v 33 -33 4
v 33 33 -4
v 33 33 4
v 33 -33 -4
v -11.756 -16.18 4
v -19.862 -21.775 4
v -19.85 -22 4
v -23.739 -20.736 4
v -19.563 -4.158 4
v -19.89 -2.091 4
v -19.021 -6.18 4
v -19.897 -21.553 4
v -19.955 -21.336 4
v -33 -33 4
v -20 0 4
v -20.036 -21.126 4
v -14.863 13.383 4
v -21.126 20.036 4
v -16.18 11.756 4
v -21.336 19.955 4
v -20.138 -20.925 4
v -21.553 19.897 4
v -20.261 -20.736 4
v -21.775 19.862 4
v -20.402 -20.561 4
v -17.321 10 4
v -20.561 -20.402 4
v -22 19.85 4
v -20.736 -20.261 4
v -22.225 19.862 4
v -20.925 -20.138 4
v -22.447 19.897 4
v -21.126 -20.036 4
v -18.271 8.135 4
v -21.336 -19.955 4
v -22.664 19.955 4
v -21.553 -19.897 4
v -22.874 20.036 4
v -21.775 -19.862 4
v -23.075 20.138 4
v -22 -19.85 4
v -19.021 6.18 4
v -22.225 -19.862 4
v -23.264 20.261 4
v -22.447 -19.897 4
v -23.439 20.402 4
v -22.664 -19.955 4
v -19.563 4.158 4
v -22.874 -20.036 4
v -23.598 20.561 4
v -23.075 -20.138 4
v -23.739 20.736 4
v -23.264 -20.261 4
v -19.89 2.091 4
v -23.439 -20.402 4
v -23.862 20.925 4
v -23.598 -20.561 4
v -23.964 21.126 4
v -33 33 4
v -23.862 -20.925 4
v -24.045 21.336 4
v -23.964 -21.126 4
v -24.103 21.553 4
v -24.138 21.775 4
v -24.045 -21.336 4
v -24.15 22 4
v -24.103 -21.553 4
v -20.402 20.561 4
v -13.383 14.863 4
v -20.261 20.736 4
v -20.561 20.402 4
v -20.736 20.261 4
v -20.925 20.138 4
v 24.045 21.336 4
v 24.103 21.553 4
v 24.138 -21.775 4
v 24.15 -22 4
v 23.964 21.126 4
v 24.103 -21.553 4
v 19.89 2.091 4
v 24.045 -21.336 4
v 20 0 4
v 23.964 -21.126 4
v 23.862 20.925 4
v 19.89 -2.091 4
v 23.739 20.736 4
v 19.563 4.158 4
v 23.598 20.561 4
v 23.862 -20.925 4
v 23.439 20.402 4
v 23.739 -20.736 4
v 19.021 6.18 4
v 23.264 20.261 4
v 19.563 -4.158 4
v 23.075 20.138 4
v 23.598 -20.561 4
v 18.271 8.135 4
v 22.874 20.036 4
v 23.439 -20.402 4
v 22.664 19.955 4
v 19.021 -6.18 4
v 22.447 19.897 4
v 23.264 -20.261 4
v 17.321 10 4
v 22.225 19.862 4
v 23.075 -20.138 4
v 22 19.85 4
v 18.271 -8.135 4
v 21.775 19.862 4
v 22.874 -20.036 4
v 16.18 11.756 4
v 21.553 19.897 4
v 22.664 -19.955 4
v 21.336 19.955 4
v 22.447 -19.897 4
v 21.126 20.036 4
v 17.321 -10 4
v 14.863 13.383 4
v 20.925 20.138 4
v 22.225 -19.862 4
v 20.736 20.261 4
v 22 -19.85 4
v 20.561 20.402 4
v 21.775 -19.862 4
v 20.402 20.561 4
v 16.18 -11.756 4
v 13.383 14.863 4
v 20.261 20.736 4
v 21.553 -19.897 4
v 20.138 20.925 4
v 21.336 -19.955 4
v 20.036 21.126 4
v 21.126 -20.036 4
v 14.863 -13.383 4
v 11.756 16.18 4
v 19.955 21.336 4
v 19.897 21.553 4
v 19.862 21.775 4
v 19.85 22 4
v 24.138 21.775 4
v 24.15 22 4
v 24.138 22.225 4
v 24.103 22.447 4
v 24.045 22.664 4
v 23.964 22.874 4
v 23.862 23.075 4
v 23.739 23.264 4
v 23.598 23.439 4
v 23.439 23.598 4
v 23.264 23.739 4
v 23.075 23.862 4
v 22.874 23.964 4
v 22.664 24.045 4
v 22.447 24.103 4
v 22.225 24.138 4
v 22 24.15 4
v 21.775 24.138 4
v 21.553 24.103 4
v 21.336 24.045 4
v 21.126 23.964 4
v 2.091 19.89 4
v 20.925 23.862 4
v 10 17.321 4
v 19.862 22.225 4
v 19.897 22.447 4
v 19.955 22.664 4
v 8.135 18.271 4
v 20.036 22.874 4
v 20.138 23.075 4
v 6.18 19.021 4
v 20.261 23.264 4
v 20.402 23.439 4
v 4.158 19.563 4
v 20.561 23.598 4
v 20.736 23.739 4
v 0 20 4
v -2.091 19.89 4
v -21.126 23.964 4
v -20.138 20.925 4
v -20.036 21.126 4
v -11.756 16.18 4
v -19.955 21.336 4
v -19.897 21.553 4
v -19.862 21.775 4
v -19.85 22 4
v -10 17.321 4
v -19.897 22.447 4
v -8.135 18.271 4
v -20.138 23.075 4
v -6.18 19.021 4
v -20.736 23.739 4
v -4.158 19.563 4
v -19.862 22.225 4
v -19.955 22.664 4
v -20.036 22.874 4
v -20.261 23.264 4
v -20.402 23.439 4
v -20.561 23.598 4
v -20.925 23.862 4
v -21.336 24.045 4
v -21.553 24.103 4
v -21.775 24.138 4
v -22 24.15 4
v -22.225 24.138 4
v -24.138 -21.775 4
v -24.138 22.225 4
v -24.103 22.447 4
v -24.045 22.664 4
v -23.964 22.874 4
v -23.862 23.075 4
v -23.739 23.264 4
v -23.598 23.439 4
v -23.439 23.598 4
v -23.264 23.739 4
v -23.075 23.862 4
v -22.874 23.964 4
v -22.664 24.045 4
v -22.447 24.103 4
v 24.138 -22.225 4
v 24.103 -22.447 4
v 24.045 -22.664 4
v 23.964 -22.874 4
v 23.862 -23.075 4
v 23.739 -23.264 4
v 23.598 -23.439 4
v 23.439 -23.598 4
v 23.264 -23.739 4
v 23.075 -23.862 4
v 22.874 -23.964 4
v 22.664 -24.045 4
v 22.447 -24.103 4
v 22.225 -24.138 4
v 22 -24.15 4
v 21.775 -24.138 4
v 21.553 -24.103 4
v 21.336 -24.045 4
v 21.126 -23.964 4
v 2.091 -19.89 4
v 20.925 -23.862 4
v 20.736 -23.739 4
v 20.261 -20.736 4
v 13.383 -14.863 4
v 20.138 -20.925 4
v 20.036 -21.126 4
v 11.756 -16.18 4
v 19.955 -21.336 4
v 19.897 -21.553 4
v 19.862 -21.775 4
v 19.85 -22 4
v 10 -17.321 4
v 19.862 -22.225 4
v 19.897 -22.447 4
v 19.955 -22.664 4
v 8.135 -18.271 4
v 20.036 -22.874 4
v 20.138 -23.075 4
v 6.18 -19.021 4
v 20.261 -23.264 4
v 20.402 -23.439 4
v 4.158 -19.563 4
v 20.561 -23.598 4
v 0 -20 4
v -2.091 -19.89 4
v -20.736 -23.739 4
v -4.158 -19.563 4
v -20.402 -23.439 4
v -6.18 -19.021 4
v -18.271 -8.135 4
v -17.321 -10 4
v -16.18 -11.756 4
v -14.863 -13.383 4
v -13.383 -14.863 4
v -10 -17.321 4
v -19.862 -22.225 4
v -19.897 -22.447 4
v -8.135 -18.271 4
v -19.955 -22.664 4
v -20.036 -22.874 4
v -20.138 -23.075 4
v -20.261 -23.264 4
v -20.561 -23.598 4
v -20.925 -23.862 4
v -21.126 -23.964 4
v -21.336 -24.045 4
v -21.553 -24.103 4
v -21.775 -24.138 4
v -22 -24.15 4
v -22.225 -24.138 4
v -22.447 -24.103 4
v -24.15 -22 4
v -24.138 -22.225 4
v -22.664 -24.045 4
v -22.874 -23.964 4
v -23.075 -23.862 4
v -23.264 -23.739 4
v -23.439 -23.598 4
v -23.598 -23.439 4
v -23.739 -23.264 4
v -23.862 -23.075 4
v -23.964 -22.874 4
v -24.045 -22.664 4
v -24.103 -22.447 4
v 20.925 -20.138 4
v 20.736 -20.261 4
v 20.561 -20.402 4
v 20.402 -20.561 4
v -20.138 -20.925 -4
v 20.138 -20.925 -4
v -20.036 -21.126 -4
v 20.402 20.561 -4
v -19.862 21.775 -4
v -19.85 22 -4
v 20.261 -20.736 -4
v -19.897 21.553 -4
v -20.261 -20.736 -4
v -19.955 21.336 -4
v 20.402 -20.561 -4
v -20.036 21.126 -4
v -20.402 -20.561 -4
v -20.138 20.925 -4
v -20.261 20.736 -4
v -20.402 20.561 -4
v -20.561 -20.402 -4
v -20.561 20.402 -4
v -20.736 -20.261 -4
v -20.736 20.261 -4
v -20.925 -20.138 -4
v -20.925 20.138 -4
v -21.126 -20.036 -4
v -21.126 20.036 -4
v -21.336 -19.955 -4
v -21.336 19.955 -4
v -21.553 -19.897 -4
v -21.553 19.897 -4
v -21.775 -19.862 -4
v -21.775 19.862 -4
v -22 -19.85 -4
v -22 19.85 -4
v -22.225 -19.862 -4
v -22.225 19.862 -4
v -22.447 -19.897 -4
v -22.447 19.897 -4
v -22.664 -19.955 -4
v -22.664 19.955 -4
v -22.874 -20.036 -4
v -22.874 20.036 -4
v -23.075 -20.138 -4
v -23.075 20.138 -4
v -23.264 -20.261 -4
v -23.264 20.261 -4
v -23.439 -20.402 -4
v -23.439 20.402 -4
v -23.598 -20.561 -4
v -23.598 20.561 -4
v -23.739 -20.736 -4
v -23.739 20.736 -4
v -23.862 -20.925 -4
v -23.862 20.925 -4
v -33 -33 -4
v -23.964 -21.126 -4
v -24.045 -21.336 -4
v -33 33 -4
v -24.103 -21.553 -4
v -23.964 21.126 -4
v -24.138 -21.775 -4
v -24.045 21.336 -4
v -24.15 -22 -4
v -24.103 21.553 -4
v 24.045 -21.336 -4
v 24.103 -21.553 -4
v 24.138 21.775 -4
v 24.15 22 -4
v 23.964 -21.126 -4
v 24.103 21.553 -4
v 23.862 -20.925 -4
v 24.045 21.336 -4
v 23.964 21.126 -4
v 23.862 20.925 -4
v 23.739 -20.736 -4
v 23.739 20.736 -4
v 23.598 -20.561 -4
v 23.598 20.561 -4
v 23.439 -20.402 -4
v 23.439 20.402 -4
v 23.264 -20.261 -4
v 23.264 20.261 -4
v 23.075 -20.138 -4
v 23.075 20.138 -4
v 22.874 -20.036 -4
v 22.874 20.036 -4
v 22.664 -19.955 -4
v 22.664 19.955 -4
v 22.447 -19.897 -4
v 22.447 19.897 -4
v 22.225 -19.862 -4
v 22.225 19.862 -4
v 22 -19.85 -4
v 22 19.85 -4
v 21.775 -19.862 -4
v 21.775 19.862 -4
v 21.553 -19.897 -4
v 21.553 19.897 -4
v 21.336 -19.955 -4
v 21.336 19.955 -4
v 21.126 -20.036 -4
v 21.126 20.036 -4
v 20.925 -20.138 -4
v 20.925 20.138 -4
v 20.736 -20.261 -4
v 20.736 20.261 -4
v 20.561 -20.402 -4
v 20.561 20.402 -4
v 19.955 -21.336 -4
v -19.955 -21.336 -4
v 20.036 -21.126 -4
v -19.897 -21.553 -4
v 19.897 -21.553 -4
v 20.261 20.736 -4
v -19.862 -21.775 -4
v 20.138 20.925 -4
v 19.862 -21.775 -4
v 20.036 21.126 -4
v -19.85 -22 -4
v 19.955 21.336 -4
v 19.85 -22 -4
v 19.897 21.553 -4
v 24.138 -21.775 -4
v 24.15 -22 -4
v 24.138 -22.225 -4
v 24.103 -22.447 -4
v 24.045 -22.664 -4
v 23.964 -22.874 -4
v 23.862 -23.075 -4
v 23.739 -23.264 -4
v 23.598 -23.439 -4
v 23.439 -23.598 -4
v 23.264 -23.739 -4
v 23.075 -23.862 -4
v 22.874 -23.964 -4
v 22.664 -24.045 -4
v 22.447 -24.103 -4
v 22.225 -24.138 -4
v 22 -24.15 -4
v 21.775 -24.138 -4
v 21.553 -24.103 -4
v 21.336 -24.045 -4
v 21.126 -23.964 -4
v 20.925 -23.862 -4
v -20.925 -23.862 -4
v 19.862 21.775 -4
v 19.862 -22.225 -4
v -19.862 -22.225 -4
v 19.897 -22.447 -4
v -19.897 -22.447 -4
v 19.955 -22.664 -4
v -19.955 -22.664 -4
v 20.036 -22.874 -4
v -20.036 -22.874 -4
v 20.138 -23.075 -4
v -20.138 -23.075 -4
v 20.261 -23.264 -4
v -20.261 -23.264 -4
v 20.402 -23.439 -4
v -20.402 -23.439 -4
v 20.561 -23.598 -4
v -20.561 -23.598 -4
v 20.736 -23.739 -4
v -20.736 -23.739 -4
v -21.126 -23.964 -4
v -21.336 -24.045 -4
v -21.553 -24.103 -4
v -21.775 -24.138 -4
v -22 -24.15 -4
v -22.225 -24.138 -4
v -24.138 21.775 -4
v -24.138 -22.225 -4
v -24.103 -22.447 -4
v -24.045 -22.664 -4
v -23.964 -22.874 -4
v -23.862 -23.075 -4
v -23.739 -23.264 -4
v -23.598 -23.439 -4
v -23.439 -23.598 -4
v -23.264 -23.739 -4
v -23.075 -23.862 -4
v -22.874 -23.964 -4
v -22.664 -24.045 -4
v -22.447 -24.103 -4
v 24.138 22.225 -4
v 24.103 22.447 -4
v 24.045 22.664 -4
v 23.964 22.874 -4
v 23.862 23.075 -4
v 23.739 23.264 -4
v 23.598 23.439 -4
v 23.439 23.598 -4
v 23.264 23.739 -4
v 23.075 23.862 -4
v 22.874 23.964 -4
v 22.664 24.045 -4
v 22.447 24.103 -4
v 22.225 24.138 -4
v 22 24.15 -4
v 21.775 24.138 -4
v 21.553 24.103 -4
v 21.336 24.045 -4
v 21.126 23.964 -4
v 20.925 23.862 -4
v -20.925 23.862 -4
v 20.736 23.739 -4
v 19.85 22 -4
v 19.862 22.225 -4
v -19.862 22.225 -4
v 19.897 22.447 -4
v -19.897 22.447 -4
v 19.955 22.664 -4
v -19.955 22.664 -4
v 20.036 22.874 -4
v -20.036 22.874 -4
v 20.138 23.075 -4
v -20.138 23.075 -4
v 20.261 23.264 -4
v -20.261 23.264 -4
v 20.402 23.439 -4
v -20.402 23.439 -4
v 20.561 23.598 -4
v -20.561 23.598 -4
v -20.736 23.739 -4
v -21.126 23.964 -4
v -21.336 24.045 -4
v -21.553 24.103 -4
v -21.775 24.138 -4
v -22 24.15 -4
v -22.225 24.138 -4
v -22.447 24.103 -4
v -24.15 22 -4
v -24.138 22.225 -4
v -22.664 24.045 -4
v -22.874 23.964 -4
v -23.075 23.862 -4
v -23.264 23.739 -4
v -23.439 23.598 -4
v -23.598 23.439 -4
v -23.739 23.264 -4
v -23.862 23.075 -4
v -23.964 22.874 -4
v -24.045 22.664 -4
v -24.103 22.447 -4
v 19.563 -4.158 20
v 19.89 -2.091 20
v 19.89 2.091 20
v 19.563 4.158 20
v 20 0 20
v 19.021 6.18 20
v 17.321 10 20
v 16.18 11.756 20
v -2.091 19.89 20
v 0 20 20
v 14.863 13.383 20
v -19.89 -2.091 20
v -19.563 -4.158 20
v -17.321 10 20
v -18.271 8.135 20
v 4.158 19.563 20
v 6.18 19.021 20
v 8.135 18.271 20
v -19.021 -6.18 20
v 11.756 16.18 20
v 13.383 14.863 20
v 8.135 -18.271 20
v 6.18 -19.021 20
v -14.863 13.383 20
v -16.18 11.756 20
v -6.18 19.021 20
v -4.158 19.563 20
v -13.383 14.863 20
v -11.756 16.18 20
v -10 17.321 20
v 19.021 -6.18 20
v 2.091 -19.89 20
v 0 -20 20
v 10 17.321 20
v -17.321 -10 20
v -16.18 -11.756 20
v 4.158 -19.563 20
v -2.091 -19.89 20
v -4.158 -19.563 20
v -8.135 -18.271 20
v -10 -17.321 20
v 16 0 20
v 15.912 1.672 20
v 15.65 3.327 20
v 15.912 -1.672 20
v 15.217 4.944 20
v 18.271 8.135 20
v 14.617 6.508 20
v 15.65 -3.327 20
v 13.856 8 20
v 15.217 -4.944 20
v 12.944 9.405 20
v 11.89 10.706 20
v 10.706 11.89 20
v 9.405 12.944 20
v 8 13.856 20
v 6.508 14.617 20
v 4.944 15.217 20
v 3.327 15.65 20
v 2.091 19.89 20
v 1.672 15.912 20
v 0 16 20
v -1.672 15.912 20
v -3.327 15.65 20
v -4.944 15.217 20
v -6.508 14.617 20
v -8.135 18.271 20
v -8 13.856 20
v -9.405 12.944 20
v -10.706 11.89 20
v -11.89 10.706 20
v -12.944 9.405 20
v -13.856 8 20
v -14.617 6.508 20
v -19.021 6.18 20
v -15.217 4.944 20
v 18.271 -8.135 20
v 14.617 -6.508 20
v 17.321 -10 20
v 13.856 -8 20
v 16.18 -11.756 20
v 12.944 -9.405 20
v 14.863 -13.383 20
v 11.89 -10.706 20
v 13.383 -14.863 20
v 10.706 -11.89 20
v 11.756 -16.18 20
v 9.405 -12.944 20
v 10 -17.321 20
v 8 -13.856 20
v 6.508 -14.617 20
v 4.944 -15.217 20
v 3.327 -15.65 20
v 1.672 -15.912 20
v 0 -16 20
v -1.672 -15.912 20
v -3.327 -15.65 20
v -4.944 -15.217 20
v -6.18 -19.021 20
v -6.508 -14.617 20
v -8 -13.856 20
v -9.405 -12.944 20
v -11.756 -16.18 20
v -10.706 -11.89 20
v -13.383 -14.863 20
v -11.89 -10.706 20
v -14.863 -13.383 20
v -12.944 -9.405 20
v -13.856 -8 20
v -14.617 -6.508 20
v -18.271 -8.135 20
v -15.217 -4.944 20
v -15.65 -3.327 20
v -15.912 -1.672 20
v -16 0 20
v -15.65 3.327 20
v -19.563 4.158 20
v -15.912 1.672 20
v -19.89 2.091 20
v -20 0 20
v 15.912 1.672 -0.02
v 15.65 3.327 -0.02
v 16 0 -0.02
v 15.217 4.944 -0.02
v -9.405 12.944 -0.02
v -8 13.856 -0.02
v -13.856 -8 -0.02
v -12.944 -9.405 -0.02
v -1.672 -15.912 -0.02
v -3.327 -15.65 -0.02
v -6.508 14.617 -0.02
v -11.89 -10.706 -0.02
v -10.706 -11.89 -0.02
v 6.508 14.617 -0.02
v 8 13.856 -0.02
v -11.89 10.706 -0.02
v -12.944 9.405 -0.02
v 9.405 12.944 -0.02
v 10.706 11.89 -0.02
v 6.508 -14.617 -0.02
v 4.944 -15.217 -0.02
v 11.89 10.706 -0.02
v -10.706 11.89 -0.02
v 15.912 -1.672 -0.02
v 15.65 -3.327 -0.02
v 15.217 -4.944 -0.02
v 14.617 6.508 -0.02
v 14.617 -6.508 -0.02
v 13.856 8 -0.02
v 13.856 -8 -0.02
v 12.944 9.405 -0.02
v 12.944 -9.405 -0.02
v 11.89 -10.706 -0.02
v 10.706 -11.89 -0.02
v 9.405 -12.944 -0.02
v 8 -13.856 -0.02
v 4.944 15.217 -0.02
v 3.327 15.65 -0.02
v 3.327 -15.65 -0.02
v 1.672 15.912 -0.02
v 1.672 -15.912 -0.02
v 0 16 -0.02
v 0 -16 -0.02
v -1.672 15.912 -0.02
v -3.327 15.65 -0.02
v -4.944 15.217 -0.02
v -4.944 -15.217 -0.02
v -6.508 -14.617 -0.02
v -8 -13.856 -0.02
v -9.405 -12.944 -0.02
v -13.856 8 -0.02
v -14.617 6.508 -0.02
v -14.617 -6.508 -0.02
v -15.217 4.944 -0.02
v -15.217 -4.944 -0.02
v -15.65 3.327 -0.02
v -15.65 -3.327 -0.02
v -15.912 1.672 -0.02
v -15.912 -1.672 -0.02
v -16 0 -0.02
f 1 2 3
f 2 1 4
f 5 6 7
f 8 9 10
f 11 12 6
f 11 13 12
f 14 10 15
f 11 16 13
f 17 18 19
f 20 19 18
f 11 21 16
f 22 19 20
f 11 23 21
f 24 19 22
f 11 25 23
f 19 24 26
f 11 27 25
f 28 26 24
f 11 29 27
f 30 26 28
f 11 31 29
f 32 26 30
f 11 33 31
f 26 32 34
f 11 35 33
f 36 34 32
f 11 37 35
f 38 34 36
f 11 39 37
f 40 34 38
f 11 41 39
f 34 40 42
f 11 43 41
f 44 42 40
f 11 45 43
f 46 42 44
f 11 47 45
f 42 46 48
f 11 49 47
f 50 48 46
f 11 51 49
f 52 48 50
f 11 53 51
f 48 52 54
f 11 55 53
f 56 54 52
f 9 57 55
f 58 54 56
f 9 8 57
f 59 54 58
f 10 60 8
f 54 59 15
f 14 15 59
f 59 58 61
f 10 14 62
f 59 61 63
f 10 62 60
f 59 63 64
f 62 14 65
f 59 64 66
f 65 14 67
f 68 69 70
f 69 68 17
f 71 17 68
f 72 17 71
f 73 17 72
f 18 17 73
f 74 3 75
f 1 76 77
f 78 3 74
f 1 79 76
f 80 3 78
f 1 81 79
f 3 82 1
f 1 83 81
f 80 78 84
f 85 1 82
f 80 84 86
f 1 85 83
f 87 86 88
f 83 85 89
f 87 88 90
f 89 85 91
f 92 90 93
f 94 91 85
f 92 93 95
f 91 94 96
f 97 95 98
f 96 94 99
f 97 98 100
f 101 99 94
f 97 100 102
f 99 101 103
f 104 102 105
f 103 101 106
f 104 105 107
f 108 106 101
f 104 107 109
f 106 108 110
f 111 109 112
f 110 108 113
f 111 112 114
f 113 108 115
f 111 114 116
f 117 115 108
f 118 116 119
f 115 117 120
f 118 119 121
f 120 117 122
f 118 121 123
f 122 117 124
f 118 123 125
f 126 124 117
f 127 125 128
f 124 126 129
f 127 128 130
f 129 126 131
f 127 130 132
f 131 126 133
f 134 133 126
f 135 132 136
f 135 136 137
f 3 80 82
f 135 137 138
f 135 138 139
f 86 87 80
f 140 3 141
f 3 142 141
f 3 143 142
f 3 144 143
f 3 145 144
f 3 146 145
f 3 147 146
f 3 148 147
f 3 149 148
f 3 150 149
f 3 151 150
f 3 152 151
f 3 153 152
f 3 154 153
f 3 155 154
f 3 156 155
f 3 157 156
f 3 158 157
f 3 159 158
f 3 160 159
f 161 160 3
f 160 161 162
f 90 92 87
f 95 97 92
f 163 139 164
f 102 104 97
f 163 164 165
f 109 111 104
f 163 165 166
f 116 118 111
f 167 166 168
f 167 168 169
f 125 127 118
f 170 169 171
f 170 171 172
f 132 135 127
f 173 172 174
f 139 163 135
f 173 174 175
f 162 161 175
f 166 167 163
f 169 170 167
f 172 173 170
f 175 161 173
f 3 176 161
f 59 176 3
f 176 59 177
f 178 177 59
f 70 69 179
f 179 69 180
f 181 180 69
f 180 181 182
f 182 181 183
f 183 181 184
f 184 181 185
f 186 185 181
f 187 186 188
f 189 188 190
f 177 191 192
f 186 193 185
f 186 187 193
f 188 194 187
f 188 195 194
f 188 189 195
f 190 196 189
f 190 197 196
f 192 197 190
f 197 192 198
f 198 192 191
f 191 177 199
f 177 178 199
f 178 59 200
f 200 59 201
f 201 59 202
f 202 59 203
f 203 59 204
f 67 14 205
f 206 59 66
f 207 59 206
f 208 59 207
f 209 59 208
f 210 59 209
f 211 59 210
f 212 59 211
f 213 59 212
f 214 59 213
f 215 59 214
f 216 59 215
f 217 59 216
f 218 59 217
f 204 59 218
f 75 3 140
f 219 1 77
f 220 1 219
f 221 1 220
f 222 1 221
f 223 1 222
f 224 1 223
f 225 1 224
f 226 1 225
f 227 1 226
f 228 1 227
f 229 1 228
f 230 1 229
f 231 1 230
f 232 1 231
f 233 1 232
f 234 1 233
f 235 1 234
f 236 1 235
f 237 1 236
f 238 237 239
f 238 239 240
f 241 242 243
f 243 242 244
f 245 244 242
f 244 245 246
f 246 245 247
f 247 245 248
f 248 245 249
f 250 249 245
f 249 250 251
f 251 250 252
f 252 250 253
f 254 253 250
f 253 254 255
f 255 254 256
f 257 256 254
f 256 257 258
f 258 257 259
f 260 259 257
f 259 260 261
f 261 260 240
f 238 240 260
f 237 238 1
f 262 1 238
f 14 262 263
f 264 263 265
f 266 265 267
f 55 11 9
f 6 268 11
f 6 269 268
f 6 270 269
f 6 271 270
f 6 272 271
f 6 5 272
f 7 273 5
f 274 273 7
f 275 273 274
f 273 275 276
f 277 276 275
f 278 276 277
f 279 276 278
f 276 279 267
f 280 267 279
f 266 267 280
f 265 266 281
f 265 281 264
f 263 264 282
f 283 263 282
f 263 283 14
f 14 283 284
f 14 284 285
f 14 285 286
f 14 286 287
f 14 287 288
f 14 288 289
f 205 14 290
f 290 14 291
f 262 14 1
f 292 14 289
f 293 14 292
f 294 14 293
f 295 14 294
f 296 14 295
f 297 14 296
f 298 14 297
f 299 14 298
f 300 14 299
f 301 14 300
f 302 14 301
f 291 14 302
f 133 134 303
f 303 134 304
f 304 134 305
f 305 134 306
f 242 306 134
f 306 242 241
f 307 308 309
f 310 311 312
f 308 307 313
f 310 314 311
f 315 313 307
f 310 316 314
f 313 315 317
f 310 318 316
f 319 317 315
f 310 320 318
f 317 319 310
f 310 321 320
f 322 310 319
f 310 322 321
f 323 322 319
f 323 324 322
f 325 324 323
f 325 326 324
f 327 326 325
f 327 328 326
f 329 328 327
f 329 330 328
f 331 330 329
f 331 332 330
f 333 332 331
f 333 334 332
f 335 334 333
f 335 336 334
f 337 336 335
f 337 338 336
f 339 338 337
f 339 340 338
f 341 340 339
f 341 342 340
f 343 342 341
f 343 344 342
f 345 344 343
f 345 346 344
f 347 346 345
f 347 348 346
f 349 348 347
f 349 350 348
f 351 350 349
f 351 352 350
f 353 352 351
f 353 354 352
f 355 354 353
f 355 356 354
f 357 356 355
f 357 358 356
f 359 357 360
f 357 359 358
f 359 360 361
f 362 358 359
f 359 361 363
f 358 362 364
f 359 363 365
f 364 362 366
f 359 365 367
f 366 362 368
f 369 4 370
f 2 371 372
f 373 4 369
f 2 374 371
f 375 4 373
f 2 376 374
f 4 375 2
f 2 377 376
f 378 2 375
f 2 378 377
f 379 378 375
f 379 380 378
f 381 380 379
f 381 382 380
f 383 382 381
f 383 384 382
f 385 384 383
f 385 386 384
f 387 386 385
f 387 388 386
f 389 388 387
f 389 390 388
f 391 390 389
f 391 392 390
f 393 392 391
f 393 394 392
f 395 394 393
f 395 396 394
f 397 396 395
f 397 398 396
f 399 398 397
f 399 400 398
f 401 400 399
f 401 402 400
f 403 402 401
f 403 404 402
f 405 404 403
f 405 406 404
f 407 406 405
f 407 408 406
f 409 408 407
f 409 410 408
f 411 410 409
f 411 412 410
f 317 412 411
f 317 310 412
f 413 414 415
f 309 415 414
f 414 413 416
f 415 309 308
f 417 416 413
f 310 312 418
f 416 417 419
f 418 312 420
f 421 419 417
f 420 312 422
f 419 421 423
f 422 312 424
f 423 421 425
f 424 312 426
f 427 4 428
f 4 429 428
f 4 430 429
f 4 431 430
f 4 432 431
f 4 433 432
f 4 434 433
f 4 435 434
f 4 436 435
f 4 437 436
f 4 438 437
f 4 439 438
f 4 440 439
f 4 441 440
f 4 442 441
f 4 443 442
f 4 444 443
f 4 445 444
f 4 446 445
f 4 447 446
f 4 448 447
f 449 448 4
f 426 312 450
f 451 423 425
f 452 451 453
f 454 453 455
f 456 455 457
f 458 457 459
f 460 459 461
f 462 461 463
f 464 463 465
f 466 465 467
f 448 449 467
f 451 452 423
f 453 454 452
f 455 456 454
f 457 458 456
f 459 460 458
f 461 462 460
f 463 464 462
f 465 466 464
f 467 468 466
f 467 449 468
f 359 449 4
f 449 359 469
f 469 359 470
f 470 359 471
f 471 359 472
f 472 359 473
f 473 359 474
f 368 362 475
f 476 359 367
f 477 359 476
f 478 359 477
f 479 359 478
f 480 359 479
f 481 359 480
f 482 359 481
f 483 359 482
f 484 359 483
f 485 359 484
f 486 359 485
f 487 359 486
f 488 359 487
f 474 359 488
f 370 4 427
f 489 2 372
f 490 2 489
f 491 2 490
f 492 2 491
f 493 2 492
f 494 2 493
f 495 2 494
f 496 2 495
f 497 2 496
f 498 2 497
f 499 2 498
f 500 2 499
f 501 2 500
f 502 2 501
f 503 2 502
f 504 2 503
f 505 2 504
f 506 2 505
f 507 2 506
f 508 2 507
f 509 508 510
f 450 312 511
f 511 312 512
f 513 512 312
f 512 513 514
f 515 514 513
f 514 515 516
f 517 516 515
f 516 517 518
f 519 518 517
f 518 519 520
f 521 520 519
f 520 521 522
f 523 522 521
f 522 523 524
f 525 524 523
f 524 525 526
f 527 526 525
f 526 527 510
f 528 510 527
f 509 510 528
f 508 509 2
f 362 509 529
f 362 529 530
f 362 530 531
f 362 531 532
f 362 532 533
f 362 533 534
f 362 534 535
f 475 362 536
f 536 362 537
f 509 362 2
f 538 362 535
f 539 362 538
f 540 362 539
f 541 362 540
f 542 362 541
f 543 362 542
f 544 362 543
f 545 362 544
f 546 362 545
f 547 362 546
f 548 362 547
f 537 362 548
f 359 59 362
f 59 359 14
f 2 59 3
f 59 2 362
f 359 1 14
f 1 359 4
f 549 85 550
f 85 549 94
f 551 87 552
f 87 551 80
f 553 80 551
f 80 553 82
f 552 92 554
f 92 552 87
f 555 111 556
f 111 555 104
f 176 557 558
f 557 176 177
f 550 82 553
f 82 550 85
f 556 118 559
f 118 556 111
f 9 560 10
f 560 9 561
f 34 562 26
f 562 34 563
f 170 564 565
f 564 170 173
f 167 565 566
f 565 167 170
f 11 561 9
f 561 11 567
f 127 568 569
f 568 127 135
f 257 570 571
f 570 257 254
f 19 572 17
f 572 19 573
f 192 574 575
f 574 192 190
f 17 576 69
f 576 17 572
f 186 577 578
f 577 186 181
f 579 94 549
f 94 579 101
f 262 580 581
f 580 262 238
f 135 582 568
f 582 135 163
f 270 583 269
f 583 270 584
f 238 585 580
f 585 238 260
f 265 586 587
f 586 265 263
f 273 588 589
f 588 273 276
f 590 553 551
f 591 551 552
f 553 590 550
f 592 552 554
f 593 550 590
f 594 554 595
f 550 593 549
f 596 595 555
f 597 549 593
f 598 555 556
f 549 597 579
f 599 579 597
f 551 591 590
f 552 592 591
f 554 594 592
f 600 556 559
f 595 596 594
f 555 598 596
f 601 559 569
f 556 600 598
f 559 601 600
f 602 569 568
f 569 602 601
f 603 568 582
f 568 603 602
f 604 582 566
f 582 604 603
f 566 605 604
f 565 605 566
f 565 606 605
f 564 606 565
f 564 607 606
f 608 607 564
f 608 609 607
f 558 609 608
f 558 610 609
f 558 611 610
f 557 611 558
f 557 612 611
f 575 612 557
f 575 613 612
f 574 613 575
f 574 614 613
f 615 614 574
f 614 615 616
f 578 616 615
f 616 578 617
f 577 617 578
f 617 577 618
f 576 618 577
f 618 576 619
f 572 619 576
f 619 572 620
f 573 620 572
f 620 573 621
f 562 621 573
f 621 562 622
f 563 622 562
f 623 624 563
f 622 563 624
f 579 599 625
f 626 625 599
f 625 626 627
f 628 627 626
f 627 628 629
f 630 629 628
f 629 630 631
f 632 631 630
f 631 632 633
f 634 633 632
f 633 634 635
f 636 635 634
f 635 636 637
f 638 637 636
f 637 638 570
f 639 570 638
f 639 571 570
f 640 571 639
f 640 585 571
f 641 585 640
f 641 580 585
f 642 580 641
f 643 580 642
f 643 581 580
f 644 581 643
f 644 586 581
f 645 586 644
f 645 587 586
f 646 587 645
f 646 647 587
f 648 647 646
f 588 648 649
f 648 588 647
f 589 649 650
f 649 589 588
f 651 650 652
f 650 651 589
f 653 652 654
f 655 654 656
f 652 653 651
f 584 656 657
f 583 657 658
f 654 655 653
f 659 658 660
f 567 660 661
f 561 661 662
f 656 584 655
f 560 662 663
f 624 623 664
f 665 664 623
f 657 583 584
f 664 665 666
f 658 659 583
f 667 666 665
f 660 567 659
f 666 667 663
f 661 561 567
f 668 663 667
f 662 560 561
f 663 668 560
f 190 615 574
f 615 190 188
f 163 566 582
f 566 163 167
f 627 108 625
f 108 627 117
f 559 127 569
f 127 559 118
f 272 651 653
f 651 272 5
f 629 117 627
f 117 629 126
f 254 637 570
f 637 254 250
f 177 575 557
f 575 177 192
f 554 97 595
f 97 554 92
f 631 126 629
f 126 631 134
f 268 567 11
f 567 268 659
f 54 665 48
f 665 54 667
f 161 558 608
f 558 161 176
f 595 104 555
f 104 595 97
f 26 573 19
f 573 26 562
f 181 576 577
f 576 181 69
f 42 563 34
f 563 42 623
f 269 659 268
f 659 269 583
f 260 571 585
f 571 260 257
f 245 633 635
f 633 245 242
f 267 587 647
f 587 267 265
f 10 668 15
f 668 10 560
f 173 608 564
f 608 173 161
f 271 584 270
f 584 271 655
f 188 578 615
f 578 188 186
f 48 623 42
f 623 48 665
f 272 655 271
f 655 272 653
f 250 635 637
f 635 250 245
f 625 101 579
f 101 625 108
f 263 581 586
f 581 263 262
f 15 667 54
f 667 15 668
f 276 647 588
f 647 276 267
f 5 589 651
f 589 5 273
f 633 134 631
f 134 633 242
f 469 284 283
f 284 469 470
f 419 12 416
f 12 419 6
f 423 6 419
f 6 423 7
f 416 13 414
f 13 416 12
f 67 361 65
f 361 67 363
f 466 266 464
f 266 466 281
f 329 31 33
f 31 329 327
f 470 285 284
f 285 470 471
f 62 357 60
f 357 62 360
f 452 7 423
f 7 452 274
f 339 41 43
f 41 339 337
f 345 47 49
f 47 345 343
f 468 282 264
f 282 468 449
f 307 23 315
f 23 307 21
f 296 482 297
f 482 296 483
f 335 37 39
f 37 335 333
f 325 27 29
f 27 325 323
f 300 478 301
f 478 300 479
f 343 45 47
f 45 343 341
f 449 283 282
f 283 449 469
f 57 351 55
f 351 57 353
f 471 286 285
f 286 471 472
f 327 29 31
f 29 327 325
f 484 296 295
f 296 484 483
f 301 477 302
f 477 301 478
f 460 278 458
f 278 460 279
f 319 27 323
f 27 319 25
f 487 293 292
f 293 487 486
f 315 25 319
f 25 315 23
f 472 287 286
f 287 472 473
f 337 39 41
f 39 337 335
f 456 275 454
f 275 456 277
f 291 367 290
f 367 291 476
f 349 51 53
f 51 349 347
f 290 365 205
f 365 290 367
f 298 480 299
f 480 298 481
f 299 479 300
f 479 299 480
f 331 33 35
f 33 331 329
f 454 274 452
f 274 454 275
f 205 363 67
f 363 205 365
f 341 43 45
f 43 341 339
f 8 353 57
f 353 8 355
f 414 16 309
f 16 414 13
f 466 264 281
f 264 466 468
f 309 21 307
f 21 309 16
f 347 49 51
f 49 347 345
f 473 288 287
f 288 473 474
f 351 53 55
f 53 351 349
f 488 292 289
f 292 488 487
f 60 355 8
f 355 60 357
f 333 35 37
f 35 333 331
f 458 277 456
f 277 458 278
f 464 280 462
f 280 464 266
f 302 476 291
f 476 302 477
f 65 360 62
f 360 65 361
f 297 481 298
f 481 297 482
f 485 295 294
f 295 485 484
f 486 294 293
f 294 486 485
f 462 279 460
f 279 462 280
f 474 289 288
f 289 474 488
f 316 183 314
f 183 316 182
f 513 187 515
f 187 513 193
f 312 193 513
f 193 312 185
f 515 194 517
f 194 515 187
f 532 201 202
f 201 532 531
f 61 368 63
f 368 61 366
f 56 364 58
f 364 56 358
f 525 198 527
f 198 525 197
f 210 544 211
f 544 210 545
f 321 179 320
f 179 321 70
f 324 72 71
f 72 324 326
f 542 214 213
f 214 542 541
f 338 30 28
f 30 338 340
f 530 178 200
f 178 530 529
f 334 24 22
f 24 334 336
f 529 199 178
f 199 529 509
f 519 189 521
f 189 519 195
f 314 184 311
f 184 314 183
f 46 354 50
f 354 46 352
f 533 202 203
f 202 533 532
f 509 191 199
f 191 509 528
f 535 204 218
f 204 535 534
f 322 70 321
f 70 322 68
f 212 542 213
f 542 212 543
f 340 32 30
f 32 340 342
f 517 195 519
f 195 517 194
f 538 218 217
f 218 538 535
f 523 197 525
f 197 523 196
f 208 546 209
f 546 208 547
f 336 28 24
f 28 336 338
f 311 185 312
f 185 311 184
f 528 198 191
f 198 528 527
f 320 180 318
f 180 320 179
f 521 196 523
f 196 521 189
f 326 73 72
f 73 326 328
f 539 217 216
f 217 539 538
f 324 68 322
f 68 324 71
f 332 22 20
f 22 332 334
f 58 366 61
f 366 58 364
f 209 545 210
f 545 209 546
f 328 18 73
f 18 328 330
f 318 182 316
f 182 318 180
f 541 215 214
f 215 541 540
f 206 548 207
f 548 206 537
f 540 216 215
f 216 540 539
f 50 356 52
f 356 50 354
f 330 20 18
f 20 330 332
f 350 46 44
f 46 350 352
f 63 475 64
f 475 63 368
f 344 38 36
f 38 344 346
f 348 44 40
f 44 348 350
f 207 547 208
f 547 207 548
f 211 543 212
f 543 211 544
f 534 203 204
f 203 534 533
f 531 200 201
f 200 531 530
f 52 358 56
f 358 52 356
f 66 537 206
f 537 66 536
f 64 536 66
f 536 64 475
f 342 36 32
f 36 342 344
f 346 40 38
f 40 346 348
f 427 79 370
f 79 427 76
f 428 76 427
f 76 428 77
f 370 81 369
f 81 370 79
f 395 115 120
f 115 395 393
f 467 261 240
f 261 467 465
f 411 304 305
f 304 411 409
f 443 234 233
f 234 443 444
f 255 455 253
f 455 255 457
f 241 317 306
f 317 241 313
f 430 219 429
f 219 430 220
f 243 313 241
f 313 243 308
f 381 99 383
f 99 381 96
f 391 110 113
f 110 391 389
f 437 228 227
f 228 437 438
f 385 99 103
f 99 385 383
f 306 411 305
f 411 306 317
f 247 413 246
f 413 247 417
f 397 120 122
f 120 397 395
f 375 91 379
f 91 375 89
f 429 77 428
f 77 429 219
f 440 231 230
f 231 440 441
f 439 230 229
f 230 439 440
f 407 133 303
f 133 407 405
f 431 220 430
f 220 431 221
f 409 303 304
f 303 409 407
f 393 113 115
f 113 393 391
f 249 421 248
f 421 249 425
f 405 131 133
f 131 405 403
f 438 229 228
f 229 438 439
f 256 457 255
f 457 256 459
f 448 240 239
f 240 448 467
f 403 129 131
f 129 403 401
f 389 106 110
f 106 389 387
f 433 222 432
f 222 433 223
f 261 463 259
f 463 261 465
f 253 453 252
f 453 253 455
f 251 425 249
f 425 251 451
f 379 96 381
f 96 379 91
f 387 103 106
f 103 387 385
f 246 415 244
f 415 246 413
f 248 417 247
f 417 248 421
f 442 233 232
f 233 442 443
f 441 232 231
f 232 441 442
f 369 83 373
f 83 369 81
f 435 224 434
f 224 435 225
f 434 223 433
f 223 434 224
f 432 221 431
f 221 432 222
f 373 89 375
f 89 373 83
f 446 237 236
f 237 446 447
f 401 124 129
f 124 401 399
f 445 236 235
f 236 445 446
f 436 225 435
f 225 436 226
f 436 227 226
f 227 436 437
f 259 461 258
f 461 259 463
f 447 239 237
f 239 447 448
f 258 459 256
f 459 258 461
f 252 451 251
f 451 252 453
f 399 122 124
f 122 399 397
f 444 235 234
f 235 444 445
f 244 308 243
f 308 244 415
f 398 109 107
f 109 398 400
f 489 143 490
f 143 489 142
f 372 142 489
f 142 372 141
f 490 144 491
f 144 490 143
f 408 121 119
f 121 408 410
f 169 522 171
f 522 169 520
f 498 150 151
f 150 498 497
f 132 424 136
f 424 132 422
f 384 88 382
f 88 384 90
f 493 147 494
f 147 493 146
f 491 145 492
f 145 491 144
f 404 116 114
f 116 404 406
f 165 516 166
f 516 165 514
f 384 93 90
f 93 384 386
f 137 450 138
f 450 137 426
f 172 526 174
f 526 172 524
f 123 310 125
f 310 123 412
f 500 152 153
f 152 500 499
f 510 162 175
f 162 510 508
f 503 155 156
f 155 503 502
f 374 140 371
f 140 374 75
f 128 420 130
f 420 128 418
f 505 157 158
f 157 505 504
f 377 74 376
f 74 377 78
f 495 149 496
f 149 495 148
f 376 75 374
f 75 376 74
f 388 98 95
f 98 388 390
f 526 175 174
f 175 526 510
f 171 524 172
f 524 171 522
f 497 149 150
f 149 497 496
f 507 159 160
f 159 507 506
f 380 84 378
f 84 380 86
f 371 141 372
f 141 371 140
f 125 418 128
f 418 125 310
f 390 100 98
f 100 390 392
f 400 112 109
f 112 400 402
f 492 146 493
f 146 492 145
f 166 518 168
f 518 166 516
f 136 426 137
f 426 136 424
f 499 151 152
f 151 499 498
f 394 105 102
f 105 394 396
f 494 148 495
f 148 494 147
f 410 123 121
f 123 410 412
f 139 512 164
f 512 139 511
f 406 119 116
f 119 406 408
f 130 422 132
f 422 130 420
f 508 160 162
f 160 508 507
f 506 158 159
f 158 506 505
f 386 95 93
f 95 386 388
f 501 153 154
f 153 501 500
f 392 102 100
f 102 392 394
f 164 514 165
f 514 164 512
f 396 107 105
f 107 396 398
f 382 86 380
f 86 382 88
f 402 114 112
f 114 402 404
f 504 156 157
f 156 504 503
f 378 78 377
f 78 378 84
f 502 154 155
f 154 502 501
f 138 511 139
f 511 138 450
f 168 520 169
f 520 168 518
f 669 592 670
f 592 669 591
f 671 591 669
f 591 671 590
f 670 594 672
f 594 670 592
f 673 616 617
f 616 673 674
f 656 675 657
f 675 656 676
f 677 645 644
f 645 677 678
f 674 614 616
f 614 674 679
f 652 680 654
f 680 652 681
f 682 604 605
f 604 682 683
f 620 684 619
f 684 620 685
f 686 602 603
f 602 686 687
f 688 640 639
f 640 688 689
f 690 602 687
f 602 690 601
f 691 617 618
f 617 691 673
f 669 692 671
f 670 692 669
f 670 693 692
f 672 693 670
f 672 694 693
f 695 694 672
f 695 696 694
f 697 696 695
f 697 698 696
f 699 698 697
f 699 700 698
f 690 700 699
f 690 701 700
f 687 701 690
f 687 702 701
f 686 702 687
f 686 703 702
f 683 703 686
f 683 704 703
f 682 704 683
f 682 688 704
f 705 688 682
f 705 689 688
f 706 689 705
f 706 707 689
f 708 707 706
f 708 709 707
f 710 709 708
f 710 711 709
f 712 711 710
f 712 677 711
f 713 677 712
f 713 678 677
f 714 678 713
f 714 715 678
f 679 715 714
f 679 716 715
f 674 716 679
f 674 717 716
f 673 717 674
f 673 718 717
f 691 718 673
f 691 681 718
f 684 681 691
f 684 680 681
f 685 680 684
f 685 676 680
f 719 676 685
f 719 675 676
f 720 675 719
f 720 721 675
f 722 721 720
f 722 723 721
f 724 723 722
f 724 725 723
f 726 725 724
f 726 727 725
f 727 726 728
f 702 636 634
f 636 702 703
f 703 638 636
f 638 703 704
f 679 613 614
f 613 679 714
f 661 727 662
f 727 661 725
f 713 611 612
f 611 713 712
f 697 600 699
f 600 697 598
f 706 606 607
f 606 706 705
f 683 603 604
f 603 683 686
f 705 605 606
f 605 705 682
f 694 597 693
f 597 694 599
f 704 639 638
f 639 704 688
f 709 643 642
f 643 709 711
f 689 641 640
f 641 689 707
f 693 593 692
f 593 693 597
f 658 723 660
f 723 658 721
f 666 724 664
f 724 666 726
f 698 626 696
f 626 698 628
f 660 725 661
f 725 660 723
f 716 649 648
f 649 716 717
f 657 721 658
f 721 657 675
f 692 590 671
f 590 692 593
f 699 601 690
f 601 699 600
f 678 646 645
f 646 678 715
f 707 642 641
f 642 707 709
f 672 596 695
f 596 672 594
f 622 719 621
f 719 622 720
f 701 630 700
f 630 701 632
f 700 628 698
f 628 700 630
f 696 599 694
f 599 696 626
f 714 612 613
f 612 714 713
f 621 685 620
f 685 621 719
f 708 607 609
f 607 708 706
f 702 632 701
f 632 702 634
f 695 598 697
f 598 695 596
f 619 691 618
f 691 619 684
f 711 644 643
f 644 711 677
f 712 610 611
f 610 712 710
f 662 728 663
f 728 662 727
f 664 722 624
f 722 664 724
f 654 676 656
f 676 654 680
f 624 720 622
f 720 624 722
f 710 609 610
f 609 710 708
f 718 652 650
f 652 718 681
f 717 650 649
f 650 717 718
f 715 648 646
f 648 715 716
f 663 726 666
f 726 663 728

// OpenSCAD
// Flange bearing block for 32 mm bearing OD.
$fn = 60;
eps = 0.02;
bearing_d = 32;
plate_l = bearing_d + 34;
plate_t = 8;
hub_h = bearing_d / 2 + 4;
difference() {
    union() {
        cube([plate_l, plate_l, plate_t], center = true);
        cylinder(d = bearing_d + 8, h = hub_h);
    }
    translate([0, 0, -eps]) cylinder(d = bearing_d, h = hub_h + 2 * eps);
    for (x = [-plate_l / 3, plate_l / 3], y = [-plate_l / 3, plate_l / 3])
        translate([x, y, -plate_t / 2 - eps]) cylinder(d = 4.3, h = plate_t + 2 * eps);
}
